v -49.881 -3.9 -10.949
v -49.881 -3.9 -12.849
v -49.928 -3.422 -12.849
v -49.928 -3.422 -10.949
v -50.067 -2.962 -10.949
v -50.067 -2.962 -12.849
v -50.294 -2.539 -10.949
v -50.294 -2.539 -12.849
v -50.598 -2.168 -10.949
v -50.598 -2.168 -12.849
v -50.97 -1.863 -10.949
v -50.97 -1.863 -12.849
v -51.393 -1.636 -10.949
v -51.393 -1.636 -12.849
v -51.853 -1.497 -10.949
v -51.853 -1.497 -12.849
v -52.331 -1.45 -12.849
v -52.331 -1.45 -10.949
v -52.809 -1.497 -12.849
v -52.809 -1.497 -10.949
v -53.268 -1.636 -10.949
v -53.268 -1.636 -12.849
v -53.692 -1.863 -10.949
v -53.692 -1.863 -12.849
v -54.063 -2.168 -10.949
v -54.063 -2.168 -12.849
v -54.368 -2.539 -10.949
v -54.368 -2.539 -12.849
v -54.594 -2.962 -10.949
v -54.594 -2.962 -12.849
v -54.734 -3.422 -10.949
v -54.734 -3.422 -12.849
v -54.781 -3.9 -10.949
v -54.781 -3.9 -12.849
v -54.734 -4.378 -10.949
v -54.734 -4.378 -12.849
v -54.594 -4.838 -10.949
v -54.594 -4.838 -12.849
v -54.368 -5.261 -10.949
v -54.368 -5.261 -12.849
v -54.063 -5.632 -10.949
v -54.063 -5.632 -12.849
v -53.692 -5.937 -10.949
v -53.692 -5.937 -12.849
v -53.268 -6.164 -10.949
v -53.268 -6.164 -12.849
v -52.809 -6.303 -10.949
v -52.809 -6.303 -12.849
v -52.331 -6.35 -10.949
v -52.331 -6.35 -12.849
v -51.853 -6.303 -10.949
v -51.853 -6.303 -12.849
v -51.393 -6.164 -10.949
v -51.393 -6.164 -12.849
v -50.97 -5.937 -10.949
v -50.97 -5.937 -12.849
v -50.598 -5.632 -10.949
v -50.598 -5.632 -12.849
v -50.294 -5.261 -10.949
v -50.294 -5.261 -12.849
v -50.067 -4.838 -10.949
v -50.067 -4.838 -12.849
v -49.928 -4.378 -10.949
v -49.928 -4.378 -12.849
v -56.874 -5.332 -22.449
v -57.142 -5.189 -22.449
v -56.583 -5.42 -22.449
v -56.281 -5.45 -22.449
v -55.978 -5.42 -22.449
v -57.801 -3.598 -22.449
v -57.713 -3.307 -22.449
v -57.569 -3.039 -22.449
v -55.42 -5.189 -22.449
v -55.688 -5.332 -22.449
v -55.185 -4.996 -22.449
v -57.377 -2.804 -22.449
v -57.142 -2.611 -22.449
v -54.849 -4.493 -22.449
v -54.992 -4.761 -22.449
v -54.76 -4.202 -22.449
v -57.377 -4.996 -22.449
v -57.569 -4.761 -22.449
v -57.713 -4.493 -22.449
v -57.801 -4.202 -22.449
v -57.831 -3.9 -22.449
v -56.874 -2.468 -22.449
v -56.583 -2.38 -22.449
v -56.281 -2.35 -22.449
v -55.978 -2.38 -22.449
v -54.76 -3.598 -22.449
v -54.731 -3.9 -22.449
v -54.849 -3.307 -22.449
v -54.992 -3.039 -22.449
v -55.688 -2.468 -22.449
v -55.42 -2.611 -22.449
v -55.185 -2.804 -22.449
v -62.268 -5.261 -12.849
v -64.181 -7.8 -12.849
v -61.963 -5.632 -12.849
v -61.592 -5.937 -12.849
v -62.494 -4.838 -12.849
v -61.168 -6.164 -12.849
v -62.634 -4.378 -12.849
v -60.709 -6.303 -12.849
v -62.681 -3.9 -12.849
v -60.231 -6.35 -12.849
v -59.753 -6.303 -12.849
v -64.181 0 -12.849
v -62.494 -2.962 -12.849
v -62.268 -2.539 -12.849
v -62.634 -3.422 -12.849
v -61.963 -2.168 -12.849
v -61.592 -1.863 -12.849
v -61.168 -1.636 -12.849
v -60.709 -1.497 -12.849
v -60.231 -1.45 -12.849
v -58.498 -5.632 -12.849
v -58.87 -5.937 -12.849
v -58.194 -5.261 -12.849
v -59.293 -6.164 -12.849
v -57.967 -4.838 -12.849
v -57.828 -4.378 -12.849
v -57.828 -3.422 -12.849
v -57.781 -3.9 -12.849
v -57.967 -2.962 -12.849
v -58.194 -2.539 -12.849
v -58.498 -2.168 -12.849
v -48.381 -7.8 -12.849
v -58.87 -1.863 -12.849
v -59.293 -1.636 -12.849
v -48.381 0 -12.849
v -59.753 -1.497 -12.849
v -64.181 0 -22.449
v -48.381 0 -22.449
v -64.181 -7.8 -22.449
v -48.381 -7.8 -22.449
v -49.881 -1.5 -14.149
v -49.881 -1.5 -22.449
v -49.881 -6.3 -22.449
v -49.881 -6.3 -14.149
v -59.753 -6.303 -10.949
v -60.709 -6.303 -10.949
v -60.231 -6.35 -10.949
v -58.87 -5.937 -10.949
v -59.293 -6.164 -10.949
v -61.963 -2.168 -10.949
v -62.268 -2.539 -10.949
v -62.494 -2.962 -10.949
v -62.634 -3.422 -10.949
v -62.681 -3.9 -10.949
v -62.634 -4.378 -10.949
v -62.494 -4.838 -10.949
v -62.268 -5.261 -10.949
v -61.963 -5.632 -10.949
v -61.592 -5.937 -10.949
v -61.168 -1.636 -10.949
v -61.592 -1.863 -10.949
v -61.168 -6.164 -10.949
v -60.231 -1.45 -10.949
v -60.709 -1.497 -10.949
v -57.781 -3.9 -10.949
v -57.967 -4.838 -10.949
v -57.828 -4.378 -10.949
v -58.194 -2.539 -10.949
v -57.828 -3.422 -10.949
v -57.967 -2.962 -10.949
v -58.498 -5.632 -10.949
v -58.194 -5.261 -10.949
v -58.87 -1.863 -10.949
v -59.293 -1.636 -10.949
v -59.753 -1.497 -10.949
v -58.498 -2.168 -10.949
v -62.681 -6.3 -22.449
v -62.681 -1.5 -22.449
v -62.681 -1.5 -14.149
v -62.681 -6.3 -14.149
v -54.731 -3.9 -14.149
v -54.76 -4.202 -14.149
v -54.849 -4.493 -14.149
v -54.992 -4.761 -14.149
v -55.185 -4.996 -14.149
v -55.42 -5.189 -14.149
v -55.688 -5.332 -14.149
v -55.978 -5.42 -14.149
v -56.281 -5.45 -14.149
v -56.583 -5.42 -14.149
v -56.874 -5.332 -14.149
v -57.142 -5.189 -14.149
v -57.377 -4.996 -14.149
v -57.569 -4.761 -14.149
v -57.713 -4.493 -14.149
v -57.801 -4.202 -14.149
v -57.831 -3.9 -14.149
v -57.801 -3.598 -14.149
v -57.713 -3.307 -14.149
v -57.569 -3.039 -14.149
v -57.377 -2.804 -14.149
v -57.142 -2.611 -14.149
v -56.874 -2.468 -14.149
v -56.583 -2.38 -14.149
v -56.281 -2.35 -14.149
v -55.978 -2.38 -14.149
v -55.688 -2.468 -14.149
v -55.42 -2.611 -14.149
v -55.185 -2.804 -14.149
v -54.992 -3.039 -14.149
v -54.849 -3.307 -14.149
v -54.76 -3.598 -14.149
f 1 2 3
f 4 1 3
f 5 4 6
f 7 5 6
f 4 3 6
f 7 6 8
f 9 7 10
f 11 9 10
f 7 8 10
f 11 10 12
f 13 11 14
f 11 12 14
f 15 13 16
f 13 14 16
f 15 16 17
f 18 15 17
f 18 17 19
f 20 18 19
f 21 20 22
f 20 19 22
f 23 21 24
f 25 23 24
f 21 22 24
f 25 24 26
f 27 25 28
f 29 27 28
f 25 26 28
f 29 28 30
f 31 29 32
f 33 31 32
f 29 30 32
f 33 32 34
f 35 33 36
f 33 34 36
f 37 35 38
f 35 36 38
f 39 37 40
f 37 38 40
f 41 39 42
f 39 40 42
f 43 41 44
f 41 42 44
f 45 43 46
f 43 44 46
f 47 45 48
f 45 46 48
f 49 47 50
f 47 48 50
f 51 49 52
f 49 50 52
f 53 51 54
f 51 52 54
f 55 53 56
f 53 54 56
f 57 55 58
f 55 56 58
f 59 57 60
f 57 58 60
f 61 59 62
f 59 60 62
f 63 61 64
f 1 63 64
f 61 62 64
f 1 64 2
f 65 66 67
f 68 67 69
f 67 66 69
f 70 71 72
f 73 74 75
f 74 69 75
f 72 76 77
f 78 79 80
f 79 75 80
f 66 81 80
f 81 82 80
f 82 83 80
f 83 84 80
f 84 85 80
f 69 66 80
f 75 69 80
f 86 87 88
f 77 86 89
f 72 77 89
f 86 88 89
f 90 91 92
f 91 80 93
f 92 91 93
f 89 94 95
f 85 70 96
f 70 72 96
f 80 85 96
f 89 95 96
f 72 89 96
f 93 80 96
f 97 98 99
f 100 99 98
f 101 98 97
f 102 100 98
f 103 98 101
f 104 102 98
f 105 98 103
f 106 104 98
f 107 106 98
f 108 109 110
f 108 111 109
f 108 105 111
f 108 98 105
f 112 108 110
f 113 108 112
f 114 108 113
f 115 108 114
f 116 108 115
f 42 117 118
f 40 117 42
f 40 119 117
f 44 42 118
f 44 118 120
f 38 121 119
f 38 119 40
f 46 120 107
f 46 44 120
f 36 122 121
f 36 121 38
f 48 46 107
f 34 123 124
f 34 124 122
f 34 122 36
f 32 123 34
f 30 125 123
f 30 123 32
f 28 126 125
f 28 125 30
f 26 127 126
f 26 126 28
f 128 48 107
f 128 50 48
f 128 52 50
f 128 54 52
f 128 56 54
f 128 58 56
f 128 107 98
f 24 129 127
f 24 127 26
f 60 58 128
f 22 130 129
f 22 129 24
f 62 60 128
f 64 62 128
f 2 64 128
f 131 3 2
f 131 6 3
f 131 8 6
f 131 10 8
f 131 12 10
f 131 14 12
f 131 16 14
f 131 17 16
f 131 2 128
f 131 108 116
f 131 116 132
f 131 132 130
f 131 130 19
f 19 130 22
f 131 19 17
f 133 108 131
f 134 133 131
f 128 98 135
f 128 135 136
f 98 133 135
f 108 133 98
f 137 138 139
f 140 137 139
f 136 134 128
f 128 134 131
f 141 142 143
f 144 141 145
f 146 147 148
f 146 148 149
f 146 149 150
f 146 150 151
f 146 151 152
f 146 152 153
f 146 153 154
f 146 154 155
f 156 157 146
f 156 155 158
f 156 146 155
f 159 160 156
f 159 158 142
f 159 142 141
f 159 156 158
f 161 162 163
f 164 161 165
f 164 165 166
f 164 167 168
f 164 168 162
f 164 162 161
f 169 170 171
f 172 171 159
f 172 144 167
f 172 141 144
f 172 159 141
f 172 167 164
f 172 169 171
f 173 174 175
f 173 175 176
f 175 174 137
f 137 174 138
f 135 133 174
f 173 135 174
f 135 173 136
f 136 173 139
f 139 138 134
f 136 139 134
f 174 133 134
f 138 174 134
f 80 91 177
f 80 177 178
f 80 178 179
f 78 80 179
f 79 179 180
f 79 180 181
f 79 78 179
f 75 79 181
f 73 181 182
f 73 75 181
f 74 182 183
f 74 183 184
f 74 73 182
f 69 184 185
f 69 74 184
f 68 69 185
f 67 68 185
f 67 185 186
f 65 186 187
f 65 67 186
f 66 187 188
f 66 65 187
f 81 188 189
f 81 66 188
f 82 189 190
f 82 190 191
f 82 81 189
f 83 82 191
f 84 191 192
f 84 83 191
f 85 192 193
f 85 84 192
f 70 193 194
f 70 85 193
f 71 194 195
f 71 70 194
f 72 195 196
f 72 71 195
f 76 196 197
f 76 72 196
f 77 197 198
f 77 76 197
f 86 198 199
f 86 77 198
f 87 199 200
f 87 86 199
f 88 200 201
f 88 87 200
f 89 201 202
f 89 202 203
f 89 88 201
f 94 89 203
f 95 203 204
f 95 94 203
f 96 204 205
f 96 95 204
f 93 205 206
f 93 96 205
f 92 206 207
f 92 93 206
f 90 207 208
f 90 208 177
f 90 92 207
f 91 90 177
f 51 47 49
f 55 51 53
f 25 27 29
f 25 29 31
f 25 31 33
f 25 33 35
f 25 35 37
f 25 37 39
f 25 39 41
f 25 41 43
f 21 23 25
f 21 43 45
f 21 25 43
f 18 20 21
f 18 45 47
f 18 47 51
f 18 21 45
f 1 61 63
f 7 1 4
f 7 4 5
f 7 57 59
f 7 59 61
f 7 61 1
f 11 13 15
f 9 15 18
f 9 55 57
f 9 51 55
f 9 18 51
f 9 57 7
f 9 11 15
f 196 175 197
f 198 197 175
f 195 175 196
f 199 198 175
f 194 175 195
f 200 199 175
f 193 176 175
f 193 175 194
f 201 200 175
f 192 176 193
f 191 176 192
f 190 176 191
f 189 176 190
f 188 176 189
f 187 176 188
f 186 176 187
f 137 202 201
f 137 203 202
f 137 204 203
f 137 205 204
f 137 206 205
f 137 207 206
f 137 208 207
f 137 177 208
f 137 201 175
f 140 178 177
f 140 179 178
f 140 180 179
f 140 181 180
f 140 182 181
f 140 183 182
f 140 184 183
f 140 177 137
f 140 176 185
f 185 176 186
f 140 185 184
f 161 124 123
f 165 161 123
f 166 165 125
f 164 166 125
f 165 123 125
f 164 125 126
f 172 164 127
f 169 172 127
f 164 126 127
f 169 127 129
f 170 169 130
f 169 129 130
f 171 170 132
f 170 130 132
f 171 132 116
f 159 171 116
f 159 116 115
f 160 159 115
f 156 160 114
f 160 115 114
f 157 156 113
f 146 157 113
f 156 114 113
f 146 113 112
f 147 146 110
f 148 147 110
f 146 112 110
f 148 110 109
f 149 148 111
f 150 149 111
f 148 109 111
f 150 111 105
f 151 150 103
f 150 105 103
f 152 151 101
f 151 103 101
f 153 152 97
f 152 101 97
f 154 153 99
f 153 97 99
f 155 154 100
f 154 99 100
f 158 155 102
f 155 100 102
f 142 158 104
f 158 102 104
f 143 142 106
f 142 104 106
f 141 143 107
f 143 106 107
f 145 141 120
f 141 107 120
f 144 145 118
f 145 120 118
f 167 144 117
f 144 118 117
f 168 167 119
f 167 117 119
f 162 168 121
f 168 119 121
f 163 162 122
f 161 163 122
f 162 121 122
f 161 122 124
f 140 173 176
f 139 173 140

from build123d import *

# Parameters (mm, degrees)
F0_W     = 15.8
F0_H     = 9.6
F1_DEPTH = 7.8
F2_R     = 2.45
F3_DEPTH = 1.9
F4_W     = 12.8
F4_H     = 4.8
F4_R     = 1.55
F5_DEPTH = 8.3


with BuildPart() as f1:
    # F0 (on Front) → F1 (new body)
    with BuildSketch(Plane.XZ):
        with Locations((-56.280687, -17.648849)):
            Rectangle(F0_W, F0_H)
    extrude(amount=F1_DEPTH)

    # F2 (on face) → F3 (join)
    with BuildSketch(Plane.XY.offset(-12.848849)):
        with Locations((-60.230687, -3.9)):
            Circle(F2_R)
        with Locations((-52.330687, -3.9)):
            Circle(F2_R)
    extrude(amount=F3_DEPTH)

    # F4 (on face) → F5 (cut)
    with BuildSketch(Plane(origin=(0, 0, -22.448849), x_dir=(1, 0, 0), z_dir=(0, 0, -1))):
        with Locations((-56.280687, 3.9)):
            Rectangle(F4_W, F4_H)
        with Locations((-56.280687, 3.9)):
            Circle(F4_R, mode=Mode.SUBTRACT)
    extrude(amount=-F5_DEPTH, mode=Mode.SUBTRACT)


solid = f1.part
